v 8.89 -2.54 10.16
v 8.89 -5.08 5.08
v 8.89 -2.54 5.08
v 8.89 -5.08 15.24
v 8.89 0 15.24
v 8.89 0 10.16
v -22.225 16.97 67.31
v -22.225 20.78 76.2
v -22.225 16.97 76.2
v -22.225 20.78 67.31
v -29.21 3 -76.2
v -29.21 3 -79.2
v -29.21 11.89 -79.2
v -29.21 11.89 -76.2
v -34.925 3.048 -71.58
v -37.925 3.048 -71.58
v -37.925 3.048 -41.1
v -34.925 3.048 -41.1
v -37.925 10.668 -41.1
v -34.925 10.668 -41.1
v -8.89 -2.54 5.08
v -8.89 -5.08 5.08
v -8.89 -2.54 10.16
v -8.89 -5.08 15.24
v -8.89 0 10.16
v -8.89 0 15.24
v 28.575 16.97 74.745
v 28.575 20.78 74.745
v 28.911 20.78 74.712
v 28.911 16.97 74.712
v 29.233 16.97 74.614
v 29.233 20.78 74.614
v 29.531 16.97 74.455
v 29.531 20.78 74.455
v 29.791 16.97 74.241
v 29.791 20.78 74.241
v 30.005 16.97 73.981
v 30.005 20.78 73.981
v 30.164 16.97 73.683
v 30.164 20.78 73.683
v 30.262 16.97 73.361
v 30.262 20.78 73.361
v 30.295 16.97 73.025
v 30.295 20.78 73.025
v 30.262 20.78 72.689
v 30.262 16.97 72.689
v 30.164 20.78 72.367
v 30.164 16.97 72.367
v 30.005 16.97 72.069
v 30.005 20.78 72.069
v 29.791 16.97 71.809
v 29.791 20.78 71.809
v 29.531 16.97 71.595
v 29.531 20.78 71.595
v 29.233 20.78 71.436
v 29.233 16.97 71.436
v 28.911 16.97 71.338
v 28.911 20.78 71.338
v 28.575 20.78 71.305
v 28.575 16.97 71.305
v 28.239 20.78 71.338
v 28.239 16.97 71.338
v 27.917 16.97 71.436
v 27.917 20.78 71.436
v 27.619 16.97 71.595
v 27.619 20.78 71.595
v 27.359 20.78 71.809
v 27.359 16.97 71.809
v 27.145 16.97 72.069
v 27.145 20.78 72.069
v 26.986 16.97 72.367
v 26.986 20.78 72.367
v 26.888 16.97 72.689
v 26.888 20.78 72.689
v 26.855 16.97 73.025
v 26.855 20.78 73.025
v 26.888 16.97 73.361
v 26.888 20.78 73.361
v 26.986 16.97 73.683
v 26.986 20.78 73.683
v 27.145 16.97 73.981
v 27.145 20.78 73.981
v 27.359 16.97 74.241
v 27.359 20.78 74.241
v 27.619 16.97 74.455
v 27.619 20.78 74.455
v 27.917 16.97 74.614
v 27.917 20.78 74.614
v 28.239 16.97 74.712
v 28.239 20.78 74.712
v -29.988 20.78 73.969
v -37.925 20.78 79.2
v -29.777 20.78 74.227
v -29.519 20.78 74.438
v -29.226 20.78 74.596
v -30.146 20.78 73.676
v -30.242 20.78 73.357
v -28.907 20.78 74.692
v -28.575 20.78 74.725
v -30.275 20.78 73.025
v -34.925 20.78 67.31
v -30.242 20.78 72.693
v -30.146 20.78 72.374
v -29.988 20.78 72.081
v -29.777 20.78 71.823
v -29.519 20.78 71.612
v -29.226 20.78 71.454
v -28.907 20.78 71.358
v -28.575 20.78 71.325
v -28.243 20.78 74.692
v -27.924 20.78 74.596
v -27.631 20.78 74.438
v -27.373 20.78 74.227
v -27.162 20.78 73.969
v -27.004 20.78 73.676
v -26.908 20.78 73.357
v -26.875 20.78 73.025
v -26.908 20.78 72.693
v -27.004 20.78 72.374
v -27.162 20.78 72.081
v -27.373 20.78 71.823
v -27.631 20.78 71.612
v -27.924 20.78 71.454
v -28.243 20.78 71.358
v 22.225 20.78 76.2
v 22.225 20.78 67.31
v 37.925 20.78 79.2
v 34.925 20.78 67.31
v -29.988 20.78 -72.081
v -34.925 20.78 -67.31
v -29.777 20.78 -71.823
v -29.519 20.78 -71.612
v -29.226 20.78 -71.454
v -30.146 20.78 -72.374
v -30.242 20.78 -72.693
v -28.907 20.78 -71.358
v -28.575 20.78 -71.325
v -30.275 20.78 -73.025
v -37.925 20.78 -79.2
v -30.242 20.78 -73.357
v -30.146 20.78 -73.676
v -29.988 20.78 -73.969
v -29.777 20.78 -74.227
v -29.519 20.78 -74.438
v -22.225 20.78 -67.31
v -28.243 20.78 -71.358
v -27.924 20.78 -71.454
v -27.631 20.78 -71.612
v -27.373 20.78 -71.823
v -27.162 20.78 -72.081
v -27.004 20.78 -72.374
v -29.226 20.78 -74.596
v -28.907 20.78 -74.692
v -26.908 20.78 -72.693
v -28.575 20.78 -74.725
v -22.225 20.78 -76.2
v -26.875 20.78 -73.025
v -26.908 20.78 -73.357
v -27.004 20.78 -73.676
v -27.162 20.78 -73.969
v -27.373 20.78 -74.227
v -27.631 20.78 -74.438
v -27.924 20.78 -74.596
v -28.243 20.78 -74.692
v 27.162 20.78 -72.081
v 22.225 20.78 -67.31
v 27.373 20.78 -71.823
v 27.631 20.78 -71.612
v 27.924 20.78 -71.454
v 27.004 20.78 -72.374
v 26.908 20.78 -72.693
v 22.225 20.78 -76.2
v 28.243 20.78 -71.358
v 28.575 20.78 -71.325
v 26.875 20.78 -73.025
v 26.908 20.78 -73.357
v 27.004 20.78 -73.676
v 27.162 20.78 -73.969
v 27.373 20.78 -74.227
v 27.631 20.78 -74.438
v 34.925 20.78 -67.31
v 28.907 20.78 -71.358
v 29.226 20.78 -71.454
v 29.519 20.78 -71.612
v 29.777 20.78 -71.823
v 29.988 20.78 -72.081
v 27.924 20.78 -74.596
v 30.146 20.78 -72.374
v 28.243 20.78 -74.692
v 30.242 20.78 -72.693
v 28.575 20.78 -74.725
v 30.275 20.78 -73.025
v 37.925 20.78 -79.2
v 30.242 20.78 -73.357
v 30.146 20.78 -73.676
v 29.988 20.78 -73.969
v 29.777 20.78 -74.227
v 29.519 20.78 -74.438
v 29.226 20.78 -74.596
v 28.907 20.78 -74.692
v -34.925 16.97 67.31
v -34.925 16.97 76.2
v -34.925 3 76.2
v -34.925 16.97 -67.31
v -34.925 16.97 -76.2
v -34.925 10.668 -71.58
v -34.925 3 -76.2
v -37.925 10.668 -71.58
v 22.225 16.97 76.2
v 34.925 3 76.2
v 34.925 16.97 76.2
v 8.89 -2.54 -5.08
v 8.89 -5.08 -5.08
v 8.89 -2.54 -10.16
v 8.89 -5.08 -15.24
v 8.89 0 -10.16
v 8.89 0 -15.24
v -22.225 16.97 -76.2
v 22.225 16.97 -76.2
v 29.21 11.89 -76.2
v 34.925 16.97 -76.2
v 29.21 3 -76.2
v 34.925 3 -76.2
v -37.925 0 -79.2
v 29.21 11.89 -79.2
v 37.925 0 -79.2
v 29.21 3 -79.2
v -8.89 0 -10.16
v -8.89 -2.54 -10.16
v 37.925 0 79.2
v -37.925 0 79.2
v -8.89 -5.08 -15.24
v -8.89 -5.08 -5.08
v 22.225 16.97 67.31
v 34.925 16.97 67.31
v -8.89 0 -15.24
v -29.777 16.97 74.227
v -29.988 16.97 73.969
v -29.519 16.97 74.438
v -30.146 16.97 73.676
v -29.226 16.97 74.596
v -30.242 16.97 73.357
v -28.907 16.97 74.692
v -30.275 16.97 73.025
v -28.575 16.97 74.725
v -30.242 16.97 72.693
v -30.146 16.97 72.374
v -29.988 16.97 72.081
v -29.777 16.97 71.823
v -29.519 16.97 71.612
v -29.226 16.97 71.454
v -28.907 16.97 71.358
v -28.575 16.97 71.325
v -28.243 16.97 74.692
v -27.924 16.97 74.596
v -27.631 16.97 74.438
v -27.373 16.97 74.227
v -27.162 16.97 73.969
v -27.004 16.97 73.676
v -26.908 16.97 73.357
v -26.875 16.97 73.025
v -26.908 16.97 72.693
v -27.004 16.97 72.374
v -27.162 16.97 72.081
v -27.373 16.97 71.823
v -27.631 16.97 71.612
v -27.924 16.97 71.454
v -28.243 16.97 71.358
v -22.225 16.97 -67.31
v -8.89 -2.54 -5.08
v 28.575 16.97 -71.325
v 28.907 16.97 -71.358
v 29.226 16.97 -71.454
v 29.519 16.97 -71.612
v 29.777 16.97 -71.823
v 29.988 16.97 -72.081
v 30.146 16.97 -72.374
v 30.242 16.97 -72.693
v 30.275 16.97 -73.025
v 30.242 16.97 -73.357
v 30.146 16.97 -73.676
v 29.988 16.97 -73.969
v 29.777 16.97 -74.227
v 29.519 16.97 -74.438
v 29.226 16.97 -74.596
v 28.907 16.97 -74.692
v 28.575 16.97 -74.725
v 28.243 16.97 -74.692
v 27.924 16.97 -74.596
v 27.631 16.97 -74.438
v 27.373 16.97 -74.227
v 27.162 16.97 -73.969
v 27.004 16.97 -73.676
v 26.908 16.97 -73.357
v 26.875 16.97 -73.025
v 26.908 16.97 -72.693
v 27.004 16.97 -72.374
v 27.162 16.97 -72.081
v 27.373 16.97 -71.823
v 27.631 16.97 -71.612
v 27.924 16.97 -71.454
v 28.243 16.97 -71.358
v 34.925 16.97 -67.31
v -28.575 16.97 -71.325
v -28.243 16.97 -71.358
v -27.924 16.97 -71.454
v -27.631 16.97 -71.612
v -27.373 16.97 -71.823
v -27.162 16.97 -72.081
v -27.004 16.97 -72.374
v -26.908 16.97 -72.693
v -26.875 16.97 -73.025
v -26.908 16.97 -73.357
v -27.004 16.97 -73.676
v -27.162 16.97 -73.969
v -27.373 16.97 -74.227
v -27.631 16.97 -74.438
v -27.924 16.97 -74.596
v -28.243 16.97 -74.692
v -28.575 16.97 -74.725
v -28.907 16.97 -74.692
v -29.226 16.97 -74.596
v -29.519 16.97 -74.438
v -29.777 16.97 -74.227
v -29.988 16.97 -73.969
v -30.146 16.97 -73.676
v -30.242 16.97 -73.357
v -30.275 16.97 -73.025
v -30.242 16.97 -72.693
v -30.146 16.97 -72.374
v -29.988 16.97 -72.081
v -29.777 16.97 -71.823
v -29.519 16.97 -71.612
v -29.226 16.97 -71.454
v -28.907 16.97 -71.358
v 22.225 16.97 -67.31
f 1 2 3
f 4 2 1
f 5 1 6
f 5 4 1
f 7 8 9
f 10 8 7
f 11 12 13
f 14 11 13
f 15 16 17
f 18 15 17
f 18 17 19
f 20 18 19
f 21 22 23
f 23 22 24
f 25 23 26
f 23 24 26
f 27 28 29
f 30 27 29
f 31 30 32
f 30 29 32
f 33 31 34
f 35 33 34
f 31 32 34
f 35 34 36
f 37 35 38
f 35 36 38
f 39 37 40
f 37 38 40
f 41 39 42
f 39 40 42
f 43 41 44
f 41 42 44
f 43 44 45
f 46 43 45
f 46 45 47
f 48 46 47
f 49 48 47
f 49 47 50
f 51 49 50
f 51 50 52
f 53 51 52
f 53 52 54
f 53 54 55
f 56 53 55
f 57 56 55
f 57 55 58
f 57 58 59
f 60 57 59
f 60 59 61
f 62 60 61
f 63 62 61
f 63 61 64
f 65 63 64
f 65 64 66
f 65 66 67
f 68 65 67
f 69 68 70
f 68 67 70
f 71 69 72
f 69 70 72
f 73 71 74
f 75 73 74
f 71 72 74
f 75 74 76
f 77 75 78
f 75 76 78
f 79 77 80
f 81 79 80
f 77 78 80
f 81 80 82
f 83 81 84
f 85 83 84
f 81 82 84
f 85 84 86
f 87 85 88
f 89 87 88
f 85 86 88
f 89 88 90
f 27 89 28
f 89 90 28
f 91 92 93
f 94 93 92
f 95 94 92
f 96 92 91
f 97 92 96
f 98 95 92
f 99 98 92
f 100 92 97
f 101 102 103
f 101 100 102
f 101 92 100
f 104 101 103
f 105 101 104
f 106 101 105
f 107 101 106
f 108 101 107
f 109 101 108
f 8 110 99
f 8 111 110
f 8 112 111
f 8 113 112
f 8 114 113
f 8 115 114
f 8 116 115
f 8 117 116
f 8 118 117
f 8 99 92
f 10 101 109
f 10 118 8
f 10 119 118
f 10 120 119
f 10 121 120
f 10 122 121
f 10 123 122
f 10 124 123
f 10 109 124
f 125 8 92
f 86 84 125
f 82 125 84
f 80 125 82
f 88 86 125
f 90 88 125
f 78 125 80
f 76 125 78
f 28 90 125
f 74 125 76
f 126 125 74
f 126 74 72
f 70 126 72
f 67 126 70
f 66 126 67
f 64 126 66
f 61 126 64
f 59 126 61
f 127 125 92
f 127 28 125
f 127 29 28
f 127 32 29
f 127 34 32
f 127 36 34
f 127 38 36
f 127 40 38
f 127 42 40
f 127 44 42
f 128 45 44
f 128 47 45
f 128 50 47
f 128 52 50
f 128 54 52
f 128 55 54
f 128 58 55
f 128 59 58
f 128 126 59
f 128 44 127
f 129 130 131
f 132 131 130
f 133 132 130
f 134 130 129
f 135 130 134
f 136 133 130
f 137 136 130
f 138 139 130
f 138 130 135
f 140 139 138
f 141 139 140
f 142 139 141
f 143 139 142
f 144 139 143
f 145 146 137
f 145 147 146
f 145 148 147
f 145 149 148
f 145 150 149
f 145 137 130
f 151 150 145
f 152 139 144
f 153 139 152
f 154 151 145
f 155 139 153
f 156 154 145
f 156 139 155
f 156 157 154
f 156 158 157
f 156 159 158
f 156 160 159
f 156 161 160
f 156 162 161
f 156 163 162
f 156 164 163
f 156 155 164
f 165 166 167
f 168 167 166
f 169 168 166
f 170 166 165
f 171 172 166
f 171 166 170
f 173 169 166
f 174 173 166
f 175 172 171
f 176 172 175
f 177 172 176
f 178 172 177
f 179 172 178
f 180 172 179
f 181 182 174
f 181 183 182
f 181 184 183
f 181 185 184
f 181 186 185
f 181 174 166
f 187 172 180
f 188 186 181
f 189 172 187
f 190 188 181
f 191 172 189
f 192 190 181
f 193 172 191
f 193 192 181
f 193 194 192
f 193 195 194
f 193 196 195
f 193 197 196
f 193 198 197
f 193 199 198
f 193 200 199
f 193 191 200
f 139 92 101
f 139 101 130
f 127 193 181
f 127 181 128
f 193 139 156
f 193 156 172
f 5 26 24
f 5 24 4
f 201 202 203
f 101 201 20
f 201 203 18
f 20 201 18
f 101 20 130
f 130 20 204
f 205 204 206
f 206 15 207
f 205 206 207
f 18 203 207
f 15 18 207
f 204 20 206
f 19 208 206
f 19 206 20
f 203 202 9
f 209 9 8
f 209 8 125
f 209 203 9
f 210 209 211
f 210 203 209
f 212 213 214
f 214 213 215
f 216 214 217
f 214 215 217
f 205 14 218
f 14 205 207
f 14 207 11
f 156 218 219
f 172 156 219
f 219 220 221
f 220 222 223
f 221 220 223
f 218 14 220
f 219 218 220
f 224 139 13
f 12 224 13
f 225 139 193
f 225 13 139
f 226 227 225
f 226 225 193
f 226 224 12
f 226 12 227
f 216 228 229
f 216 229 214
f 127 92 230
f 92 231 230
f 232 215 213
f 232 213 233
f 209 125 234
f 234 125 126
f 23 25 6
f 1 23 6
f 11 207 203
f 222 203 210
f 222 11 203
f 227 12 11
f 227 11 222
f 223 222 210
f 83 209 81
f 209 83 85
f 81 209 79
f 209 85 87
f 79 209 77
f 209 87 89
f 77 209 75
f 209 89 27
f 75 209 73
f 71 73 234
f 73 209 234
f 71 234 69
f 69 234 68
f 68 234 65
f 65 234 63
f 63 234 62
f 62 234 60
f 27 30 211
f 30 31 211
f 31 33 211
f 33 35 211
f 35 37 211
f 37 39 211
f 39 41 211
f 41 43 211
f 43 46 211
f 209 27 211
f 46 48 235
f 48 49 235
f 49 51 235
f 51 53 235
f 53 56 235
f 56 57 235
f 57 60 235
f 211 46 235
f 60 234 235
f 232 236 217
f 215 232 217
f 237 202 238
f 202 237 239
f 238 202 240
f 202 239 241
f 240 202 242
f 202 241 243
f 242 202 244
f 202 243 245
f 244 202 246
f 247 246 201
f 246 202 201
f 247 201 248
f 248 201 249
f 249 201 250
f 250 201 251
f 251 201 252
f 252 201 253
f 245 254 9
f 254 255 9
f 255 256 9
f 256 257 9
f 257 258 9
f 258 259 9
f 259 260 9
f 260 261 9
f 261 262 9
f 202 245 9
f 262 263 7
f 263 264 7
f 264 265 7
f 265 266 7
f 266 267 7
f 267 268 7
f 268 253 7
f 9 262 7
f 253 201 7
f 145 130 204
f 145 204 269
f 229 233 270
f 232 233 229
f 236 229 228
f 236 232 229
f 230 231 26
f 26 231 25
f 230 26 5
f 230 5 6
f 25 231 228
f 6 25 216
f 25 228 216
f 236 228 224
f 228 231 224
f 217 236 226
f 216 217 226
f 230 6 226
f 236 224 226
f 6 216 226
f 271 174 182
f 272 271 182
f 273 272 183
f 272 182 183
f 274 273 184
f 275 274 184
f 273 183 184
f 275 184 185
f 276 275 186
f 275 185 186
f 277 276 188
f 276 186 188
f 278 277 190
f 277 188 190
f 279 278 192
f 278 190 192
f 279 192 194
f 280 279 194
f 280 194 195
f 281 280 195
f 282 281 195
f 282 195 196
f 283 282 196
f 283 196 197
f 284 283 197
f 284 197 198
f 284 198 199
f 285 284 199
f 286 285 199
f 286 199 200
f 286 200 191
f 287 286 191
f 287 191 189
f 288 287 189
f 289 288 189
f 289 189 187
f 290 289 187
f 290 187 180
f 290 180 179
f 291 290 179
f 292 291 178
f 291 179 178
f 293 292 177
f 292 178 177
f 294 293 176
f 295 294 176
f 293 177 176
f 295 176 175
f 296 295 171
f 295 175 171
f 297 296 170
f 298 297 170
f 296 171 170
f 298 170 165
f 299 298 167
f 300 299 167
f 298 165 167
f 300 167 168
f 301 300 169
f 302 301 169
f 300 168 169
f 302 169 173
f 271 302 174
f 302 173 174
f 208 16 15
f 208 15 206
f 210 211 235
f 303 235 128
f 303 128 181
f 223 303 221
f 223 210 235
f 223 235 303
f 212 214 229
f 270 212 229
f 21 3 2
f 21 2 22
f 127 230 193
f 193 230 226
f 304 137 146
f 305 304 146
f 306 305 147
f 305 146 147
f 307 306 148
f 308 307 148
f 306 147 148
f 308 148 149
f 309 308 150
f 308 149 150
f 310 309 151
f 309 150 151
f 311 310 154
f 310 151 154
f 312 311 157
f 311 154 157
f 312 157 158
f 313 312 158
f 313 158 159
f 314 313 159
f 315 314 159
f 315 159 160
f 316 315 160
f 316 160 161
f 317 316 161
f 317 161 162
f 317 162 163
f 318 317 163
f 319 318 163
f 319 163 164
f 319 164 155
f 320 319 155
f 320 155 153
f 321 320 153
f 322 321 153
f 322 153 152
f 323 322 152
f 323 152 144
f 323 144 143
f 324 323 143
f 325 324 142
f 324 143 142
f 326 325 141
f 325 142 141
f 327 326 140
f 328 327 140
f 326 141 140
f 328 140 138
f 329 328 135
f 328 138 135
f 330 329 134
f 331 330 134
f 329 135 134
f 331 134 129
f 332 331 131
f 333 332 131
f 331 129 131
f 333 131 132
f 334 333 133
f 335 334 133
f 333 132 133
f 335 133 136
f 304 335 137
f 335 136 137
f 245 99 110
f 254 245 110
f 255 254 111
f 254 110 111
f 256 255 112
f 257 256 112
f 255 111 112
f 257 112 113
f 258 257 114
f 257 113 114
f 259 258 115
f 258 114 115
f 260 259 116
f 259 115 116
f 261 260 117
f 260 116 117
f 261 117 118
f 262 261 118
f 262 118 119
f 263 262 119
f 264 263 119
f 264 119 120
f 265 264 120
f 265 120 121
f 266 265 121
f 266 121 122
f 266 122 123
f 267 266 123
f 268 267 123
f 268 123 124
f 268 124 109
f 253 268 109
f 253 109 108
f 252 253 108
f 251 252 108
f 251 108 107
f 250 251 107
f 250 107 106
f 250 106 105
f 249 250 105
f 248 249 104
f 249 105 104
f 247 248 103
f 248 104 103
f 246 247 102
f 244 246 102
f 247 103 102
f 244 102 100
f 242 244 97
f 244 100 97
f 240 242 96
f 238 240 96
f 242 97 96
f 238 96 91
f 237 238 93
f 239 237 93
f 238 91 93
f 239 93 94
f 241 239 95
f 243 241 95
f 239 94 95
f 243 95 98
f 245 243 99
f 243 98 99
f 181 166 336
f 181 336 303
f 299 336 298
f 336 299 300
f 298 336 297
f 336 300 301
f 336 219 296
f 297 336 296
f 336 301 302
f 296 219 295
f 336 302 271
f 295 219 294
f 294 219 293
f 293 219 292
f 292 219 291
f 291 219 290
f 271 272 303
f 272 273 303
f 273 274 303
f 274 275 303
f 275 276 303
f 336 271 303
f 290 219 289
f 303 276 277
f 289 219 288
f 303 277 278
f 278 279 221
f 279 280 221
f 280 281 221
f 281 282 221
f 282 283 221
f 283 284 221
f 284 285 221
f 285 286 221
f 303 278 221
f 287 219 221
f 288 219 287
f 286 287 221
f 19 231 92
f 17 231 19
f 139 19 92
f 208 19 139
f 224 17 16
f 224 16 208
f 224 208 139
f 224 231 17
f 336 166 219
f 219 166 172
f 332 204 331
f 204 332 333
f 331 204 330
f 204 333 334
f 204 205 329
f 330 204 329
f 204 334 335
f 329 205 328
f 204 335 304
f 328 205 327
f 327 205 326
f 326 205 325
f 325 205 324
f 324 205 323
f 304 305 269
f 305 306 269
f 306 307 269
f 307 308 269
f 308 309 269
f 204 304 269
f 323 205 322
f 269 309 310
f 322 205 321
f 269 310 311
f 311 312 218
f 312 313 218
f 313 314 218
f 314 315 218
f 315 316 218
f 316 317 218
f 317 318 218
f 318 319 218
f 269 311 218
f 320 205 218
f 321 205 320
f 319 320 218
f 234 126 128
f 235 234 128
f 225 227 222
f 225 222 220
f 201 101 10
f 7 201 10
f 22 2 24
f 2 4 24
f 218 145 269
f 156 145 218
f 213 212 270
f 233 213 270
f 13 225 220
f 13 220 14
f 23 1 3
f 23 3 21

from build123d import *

# Parameters (mm, degrees)
SKETCH1_W           = 75.85
SKETCH1_H           = 158.4
BOSS_EXTRUDE1_DEPTH = 3
SKETCH2_W           = 75.85
SKETCH2_H           = 158.4
SKETCH2_W_2         = 69.85
SKETCH2_H_2         = 152.4
BOSS_EXTRUDE2_DEPTH = 17.78
SKETCH3_W           = 12.7
SKETCH3_H           = 8.89
BOSS_EXTRUDE3_DEPTH = 3.81
CUT_EXTRUDE4_REACH  = 92.237
SKETCH4_R           = 1.7
SKETCH4_R_2         = 1.72
CUT_EXTRUDE5_REACH  = 166.197
SKETCH10_W          = 58.42
SKETCH10_H          = 8.89
CUT_EXTRUDE6_REACH  = 113.614
SKETCH11_W          = 30.48
SKETCH11_H          = 7.62
SKETCH12_W          = 17.78
SKETCH12_H          = 5.08
BOSS_EXTRUDE4_DEPTH = 5.08
SKETCH13_W          = 17.78
SKETCH13_H          = 2.54
BOSS_EXTRUDE5_DEPTH = 5.08


with BuildPart() as part:
    # Sketch1 → Boss-Extrude1 (new body)
    with BuildSketch(Plane(origin=(0, 0, 0), x_dir=(1, 0, 0), z_dir=(0, 1, 0))):
        Rectangle(SKETCH1_W, SKETCH1_H)
    extrude(amount=BOSS_EXTRUDE1_DEPTH)

    # Sketch2 → Boss-Extrude2 (add)
    with BuildSketch(Plane(origin=(0, 3, 0), x_dir=(1, 0, 0), z_dir=(0, 1, 0))):
        Rectangle(SKETCH2_W, SKETCH2_H)
        Rectangle(SKETCH2_W_2, SKETCH2_H_2, mode=Mode.SUBTRACT)
    extrude(amount=BOSS_EXTRUDE2_DEPTH)

    # Sketch3 → Boss-Extrude3 (add)
    with BuildSketch(Plane(origin=(0, 20.78, 0), x_dir=(1, 0, 0), z_dir=(0, 1, 0))):
        with Locations((-28.575, 71.755)):
            Rectangle(SKETCH3_W, SKETCH3_H)
        with Locations((-28.575, -71.755)):
            Rectangle(SKETCH3_W, SKETCH3_H)
        with Locations((28.575, 71.755)):
            Rectangle(SKETCH3_W, SKETCH3_H)
        with Locations((28.575, -71.755)):
            Rectangle(SKETCH3_W, SKETCH3_H)
    extrude(amount=-BOSS_EXTRUDE3_DEPTH)

    # Sketch4 → Cut-Extrude4 (cut, up to next)
    with BuildSketch(Plane(origin=(0, 20.78, 0), x_dir=(1, 0, 0), z_dir=(0, 1, 0)), mode=Mode.PRIVATE) as cut_extrude4_sk1:
        with Locations(Location((-28.575, 73.025, 0), (0, 0, 270))):
            Circle(SKETCH4_R)
    cut_extrude4_tool1 = extrude(cut_extrude4_sk1.sketch, amount=-CUT_EXTRUDE4_REACH, mode=Mode.PRIVATE) & part.part
    # Sketch4 → Cut-Extrude4 (cut, up to next)
    with BuildSketch(Plane(origin=(0, 20.78, 0), x_dir=(1, 0, 0), z_dir=(0, 1, 0)), mode=Mode.PRIVATE) as cut_extrude4_sk2:
        with Locations(Location((28.575, 73.025, 0), (0, 0, 270))):
            Circle(SKETCH4_R)
    cut_extrude4_tool2 = extrude(cut_extrude4_sk2.sketch, amount=-CUT_EXTRUDE4_REACH, mode=Mode.PRIVATE) & part.part
    # Sketch4 → Cut-Extrude4 (cut, up to next)
    with BuildSketch(Plane(origin=(0, 20.78, 0), x_dir=(1, 0, 0), z_dir=(0, 1, 0)), mode=Mode.PRIVATE) as cut_extrude4_sk3:
        with Locations(Location((28.575, -73.025, 0), (0, 0, 270))):
            Circle(SKETCH4_R_2)
    cut_extrude4_tool3 = extrude(cut_extrude4_sk3.sketch, amount=-CUT_EXTRUDE4_REACH, mode=Mode.PRIVATE) & part.part
    # Sketch4 → Cut-Extrude4 (cut, up to next)
    with BuildSketch(Plane(origin=(0, 20.78, 0), x_dir=(1, 0, 0), z_dir=(0, 1, 0)), mode=Mode.PRIVATE) as cut_extrude4_sk4:
        with Locations(Location((-28.575, -73.025, 0), (0, 0, 270))):
            Circle(SKETCH4_R)
    cut_extrude4_tool4 = extrude(cut_extrude4_sk4.sketch, amount=-CUT_EXTRUDE4_REACH, mode=Mode.PRIVATE) & part.part
    add(cut_extrude4_tool1.solids().sort_by_distance((-28.575, 20.78, -73.025))[0], mode=Mode.SUBTRACT)
    add(cut_extrude4_tool2.solids().sort_by_distance((28.575, 20.78, -73.025))[0], mode=Mode.SUBTRACT)
    add(cut_extrude4_tool3.solids().sort_by_distance((28.575, 20.78, 73.025))[0], mode=Mode.SUBTRACT)
    add(cut_extrude4_tool4.solids().sort_by_distance((-28.575, 20.78, 73.025))[0], mode=Mode.SUBTRACT)

    # Sketch10 → Cut-Extrude5 (cut, up to next)
    with BuildSketch(Plane(origin=(0, 0, -79.2), x_dir=(-1, 0, 0), z_dir=(0, 0, -1)), mode=Mode.PRIVATE) as cut_extrude5_sk1:
        with Locations((0, 7.445)):
            Rectangle(SKETCH10_W, SKETCH10_H)
    cut_extrude5_tool1 = extrude(cut_extrude5_sk1.sketch, amount=-CUT_EXTRUDE5_REACH, mode=Mode.PRIVATE) & part.part
    add(cut_extrude5_tool1.solids().sort_by_distance((0, 7.445, -79.2))[0], mode=Mode.SUBTRACT)

    # Sketch11 → Cut-Extrude6 (cut, up to next)
    with BuildSketch(Plane.ZY.offset(37.925), mode=Mode.PRIVATE) as cut_extrude6_sk1:
        with Locations((-56.34, 6.858)):
            Rectangle(SKETCH11_W, SKETCH11_H)
    cut_extrude6_tool1 = extrude(cut_extrude6_sk1.sketch, amount=-CUT_EXTRUDE6_REACH, mode=Mode.PRIVATE) & part.part
    add(cut_extrude6_tool1.solids().sort_by_distance((-37.925, 6.858, -56.34))[0], mode=Mode.SUBTRACT)

    # Sketch12 → Boss-Extrude4 (add)
    with BuildSketch(Plane.XZ):
        with Locations((0, 12.7)):
            Rectangle(SKETCH12_W, SKETCH12_H)
        with Locations((0, -12.7)):
            Rectangle(SKETCH12_W, SKETCH12_H)
    extrude(amount=BOSS_EXTRUDE4_DEPTH)

    # Sketch13 → Boss-Extrude5 (add)
    with BuildSketch(Plane(origin=(0, 0, 10.16), x_dir=(-1, 0, 0), z_dir=(0, 0, -1))):
        with Locations((0, -3.81)):
            Rectangle(SKETCH13_W, SKETCH13_H)
    boss_extrude5 = extrude(amount=BOSS_EXTRUDE5_DEPTH)

    # Mirror1: Boss-Extrude5 across plane
    add(boss_extrude5.mirror(Plane(origin=(0, 0, 0), x_dir=(1, 0, 0), z_dir=(0, 0, -1))))


solid = part.part
